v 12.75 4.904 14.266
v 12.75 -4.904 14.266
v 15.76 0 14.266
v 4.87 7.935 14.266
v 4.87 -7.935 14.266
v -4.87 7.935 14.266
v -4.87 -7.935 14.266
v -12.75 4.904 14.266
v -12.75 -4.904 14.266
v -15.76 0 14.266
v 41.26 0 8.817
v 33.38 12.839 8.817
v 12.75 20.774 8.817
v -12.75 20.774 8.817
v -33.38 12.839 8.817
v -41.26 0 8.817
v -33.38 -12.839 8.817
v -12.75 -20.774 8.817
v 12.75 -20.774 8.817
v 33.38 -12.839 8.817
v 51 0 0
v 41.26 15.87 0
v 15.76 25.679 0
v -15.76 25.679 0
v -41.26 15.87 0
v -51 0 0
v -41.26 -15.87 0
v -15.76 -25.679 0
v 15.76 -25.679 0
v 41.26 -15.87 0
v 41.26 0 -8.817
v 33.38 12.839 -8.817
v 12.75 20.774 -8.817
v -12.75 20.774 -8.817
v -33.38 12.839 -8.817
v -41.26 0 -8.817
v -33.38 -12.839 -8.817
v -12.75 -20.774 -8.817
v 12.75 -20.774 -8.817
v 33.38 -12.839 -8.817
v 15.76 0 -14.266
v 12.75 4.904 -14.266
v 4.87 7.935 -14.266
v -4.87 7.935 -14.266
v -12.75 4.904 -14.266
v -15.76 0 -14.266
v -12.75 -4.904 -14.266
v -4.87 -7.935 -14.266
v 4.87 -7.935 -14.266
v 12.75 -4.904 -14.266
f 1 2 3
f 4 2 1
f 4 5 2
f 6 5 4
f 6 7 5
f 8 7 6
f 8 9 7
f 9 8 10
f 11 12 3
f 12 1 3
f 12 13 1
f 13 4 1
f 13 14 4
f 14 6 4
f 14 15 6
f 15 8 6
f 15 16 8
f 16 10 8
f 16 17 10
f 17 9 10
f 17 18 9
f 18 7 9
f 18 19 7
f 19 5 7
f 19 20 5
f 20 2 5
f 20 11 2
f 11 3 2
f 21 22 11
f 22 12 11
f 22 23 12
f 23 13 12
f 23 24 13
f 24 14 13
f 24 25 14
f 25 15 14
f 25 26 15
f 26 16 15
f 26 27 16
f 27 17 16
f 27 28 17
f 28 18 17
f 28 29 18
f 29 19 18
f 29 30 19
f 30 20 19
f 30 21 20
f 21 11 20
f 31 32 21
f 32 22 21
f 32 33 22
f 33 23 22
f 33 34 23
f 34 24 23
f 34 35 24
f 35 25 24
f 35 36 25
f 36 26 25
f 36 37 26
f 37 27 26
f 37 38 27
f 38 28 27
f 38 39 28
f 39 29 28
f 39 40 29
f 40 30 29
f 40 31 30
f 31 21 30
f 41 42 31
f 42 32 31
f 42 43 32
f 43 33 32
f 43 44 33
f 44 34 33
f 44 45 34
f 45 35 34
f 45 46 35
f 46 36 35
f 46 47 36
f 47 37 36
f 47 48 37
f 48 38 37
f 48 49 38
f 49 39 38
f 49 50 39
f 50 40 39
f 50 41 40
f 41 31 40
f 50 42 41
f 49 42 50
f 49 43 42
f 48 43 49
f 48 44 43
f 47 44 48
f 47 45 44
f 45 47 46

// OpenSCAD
// Generated by SolidPython 1.0.1 on 2020-07-29 00:46:53


scale(v = [17, 9, 5]) {
	sphere(r = 3);
}
/***********************************************
*********      SolidPython code:      **********
************************************************
 
# import packages: SolidPython
from solid import *
from solid.utils import *
from itertools import chain, combinations, permutations


class Resize:

    def __init__(self, scad_file):
        self.scad_file = scad_file
        #self.scad_file = import_scad(scad_file)
        # cone/cylinder param:
        self.r1 = 0
        self.r2 = 0
        self.h = 0
        # rectangular prism param:
        self.w = 0
        self.l = 0
        # ellipse param:
        self.r = 0

    # import OpenScad code (file name corresponds to shape)


    # classify shape + parameters
    def assign(self, param1, param2, param3):
        if self.scad_file == 'cone.scad':
            self.r1 = param1
            self.r2 = param2
            self.h = param3
        elif self.scad_file == 'cylinder.scad':
            self.r1 = param1
            self.r2 = param2
            self.h = param3
        elif self.scad_file == 'rectangularPrism.scad':
            self.h = param1
            self.l = param2
            self.w = param3
        else:
            self.r = param1
            self.h = param2

    # resize parameters
    def iterate(self):
        x = range(3, 20, 2)
        i = 1
        if self.scad_file == 'cone.scad':
            tempList = list(permutations(x, 2))
            for temp in tempList:
                param1 = temp[0]
                param2 = temp[1]
                filepath = 'produced_scad_files/' + 'cone' + str(param1) + '_' + str(param2) + '_' + '.scad'
                scad_render_to_file(cylinder(h=param1, r1=param2, r2=0), filepath)

        elif self.scad_file == 'cylinder.scad':
            tempList = list(permutations(x, 3))
            for temp in tempList:
                param1 = temp[0]
                param2 = temp[1]
                filepath = 'produced_scad_files/' + 'cylinder' + str(param1) + '_' + str(param2) + '_' + '.scad'
                scad_render_to_file(cylinder(h=param1, r1=param2, r2=param2), filepath)

        elif self.scad_file == 'rectangularPrism.scad':
            tempList = list(permutations(x, 3))
            for temp in tempList:
                param1 = temp[0]
                param2 = temp[1]
                param3 = temp[2]
                filepath = 'produced_scad_files/' + 'rectangularPrism' + str(param1) + '_' + str(param2) + '_' + str(
                    param3) + '.scad'
                scad_render_to_file(cube(size=(param1, param2, param3)), filepath)

        elif self.scad_file == 'ellipse.scad':
            tempList = list(permutations(x, 4))
            for temp in tempList:
                param1 = temp[0]
                param2 = temp[1]
                param3 = temp[2]
                param4 = temp[3]
                filepath = 'produced_scad_files/' + 'ellipse' + str(param1) + '_' + str(param2) + '_' + str(param3) + '_' + str(param4) + '.scad'
                scad_render_to_file(scale([param1, param2, param3])(sphere(r=param4)), filepath)

    def render_to_scadfile(self):
        scad_render_to_file(scad, 'example.scad') 
 
************************************************/
